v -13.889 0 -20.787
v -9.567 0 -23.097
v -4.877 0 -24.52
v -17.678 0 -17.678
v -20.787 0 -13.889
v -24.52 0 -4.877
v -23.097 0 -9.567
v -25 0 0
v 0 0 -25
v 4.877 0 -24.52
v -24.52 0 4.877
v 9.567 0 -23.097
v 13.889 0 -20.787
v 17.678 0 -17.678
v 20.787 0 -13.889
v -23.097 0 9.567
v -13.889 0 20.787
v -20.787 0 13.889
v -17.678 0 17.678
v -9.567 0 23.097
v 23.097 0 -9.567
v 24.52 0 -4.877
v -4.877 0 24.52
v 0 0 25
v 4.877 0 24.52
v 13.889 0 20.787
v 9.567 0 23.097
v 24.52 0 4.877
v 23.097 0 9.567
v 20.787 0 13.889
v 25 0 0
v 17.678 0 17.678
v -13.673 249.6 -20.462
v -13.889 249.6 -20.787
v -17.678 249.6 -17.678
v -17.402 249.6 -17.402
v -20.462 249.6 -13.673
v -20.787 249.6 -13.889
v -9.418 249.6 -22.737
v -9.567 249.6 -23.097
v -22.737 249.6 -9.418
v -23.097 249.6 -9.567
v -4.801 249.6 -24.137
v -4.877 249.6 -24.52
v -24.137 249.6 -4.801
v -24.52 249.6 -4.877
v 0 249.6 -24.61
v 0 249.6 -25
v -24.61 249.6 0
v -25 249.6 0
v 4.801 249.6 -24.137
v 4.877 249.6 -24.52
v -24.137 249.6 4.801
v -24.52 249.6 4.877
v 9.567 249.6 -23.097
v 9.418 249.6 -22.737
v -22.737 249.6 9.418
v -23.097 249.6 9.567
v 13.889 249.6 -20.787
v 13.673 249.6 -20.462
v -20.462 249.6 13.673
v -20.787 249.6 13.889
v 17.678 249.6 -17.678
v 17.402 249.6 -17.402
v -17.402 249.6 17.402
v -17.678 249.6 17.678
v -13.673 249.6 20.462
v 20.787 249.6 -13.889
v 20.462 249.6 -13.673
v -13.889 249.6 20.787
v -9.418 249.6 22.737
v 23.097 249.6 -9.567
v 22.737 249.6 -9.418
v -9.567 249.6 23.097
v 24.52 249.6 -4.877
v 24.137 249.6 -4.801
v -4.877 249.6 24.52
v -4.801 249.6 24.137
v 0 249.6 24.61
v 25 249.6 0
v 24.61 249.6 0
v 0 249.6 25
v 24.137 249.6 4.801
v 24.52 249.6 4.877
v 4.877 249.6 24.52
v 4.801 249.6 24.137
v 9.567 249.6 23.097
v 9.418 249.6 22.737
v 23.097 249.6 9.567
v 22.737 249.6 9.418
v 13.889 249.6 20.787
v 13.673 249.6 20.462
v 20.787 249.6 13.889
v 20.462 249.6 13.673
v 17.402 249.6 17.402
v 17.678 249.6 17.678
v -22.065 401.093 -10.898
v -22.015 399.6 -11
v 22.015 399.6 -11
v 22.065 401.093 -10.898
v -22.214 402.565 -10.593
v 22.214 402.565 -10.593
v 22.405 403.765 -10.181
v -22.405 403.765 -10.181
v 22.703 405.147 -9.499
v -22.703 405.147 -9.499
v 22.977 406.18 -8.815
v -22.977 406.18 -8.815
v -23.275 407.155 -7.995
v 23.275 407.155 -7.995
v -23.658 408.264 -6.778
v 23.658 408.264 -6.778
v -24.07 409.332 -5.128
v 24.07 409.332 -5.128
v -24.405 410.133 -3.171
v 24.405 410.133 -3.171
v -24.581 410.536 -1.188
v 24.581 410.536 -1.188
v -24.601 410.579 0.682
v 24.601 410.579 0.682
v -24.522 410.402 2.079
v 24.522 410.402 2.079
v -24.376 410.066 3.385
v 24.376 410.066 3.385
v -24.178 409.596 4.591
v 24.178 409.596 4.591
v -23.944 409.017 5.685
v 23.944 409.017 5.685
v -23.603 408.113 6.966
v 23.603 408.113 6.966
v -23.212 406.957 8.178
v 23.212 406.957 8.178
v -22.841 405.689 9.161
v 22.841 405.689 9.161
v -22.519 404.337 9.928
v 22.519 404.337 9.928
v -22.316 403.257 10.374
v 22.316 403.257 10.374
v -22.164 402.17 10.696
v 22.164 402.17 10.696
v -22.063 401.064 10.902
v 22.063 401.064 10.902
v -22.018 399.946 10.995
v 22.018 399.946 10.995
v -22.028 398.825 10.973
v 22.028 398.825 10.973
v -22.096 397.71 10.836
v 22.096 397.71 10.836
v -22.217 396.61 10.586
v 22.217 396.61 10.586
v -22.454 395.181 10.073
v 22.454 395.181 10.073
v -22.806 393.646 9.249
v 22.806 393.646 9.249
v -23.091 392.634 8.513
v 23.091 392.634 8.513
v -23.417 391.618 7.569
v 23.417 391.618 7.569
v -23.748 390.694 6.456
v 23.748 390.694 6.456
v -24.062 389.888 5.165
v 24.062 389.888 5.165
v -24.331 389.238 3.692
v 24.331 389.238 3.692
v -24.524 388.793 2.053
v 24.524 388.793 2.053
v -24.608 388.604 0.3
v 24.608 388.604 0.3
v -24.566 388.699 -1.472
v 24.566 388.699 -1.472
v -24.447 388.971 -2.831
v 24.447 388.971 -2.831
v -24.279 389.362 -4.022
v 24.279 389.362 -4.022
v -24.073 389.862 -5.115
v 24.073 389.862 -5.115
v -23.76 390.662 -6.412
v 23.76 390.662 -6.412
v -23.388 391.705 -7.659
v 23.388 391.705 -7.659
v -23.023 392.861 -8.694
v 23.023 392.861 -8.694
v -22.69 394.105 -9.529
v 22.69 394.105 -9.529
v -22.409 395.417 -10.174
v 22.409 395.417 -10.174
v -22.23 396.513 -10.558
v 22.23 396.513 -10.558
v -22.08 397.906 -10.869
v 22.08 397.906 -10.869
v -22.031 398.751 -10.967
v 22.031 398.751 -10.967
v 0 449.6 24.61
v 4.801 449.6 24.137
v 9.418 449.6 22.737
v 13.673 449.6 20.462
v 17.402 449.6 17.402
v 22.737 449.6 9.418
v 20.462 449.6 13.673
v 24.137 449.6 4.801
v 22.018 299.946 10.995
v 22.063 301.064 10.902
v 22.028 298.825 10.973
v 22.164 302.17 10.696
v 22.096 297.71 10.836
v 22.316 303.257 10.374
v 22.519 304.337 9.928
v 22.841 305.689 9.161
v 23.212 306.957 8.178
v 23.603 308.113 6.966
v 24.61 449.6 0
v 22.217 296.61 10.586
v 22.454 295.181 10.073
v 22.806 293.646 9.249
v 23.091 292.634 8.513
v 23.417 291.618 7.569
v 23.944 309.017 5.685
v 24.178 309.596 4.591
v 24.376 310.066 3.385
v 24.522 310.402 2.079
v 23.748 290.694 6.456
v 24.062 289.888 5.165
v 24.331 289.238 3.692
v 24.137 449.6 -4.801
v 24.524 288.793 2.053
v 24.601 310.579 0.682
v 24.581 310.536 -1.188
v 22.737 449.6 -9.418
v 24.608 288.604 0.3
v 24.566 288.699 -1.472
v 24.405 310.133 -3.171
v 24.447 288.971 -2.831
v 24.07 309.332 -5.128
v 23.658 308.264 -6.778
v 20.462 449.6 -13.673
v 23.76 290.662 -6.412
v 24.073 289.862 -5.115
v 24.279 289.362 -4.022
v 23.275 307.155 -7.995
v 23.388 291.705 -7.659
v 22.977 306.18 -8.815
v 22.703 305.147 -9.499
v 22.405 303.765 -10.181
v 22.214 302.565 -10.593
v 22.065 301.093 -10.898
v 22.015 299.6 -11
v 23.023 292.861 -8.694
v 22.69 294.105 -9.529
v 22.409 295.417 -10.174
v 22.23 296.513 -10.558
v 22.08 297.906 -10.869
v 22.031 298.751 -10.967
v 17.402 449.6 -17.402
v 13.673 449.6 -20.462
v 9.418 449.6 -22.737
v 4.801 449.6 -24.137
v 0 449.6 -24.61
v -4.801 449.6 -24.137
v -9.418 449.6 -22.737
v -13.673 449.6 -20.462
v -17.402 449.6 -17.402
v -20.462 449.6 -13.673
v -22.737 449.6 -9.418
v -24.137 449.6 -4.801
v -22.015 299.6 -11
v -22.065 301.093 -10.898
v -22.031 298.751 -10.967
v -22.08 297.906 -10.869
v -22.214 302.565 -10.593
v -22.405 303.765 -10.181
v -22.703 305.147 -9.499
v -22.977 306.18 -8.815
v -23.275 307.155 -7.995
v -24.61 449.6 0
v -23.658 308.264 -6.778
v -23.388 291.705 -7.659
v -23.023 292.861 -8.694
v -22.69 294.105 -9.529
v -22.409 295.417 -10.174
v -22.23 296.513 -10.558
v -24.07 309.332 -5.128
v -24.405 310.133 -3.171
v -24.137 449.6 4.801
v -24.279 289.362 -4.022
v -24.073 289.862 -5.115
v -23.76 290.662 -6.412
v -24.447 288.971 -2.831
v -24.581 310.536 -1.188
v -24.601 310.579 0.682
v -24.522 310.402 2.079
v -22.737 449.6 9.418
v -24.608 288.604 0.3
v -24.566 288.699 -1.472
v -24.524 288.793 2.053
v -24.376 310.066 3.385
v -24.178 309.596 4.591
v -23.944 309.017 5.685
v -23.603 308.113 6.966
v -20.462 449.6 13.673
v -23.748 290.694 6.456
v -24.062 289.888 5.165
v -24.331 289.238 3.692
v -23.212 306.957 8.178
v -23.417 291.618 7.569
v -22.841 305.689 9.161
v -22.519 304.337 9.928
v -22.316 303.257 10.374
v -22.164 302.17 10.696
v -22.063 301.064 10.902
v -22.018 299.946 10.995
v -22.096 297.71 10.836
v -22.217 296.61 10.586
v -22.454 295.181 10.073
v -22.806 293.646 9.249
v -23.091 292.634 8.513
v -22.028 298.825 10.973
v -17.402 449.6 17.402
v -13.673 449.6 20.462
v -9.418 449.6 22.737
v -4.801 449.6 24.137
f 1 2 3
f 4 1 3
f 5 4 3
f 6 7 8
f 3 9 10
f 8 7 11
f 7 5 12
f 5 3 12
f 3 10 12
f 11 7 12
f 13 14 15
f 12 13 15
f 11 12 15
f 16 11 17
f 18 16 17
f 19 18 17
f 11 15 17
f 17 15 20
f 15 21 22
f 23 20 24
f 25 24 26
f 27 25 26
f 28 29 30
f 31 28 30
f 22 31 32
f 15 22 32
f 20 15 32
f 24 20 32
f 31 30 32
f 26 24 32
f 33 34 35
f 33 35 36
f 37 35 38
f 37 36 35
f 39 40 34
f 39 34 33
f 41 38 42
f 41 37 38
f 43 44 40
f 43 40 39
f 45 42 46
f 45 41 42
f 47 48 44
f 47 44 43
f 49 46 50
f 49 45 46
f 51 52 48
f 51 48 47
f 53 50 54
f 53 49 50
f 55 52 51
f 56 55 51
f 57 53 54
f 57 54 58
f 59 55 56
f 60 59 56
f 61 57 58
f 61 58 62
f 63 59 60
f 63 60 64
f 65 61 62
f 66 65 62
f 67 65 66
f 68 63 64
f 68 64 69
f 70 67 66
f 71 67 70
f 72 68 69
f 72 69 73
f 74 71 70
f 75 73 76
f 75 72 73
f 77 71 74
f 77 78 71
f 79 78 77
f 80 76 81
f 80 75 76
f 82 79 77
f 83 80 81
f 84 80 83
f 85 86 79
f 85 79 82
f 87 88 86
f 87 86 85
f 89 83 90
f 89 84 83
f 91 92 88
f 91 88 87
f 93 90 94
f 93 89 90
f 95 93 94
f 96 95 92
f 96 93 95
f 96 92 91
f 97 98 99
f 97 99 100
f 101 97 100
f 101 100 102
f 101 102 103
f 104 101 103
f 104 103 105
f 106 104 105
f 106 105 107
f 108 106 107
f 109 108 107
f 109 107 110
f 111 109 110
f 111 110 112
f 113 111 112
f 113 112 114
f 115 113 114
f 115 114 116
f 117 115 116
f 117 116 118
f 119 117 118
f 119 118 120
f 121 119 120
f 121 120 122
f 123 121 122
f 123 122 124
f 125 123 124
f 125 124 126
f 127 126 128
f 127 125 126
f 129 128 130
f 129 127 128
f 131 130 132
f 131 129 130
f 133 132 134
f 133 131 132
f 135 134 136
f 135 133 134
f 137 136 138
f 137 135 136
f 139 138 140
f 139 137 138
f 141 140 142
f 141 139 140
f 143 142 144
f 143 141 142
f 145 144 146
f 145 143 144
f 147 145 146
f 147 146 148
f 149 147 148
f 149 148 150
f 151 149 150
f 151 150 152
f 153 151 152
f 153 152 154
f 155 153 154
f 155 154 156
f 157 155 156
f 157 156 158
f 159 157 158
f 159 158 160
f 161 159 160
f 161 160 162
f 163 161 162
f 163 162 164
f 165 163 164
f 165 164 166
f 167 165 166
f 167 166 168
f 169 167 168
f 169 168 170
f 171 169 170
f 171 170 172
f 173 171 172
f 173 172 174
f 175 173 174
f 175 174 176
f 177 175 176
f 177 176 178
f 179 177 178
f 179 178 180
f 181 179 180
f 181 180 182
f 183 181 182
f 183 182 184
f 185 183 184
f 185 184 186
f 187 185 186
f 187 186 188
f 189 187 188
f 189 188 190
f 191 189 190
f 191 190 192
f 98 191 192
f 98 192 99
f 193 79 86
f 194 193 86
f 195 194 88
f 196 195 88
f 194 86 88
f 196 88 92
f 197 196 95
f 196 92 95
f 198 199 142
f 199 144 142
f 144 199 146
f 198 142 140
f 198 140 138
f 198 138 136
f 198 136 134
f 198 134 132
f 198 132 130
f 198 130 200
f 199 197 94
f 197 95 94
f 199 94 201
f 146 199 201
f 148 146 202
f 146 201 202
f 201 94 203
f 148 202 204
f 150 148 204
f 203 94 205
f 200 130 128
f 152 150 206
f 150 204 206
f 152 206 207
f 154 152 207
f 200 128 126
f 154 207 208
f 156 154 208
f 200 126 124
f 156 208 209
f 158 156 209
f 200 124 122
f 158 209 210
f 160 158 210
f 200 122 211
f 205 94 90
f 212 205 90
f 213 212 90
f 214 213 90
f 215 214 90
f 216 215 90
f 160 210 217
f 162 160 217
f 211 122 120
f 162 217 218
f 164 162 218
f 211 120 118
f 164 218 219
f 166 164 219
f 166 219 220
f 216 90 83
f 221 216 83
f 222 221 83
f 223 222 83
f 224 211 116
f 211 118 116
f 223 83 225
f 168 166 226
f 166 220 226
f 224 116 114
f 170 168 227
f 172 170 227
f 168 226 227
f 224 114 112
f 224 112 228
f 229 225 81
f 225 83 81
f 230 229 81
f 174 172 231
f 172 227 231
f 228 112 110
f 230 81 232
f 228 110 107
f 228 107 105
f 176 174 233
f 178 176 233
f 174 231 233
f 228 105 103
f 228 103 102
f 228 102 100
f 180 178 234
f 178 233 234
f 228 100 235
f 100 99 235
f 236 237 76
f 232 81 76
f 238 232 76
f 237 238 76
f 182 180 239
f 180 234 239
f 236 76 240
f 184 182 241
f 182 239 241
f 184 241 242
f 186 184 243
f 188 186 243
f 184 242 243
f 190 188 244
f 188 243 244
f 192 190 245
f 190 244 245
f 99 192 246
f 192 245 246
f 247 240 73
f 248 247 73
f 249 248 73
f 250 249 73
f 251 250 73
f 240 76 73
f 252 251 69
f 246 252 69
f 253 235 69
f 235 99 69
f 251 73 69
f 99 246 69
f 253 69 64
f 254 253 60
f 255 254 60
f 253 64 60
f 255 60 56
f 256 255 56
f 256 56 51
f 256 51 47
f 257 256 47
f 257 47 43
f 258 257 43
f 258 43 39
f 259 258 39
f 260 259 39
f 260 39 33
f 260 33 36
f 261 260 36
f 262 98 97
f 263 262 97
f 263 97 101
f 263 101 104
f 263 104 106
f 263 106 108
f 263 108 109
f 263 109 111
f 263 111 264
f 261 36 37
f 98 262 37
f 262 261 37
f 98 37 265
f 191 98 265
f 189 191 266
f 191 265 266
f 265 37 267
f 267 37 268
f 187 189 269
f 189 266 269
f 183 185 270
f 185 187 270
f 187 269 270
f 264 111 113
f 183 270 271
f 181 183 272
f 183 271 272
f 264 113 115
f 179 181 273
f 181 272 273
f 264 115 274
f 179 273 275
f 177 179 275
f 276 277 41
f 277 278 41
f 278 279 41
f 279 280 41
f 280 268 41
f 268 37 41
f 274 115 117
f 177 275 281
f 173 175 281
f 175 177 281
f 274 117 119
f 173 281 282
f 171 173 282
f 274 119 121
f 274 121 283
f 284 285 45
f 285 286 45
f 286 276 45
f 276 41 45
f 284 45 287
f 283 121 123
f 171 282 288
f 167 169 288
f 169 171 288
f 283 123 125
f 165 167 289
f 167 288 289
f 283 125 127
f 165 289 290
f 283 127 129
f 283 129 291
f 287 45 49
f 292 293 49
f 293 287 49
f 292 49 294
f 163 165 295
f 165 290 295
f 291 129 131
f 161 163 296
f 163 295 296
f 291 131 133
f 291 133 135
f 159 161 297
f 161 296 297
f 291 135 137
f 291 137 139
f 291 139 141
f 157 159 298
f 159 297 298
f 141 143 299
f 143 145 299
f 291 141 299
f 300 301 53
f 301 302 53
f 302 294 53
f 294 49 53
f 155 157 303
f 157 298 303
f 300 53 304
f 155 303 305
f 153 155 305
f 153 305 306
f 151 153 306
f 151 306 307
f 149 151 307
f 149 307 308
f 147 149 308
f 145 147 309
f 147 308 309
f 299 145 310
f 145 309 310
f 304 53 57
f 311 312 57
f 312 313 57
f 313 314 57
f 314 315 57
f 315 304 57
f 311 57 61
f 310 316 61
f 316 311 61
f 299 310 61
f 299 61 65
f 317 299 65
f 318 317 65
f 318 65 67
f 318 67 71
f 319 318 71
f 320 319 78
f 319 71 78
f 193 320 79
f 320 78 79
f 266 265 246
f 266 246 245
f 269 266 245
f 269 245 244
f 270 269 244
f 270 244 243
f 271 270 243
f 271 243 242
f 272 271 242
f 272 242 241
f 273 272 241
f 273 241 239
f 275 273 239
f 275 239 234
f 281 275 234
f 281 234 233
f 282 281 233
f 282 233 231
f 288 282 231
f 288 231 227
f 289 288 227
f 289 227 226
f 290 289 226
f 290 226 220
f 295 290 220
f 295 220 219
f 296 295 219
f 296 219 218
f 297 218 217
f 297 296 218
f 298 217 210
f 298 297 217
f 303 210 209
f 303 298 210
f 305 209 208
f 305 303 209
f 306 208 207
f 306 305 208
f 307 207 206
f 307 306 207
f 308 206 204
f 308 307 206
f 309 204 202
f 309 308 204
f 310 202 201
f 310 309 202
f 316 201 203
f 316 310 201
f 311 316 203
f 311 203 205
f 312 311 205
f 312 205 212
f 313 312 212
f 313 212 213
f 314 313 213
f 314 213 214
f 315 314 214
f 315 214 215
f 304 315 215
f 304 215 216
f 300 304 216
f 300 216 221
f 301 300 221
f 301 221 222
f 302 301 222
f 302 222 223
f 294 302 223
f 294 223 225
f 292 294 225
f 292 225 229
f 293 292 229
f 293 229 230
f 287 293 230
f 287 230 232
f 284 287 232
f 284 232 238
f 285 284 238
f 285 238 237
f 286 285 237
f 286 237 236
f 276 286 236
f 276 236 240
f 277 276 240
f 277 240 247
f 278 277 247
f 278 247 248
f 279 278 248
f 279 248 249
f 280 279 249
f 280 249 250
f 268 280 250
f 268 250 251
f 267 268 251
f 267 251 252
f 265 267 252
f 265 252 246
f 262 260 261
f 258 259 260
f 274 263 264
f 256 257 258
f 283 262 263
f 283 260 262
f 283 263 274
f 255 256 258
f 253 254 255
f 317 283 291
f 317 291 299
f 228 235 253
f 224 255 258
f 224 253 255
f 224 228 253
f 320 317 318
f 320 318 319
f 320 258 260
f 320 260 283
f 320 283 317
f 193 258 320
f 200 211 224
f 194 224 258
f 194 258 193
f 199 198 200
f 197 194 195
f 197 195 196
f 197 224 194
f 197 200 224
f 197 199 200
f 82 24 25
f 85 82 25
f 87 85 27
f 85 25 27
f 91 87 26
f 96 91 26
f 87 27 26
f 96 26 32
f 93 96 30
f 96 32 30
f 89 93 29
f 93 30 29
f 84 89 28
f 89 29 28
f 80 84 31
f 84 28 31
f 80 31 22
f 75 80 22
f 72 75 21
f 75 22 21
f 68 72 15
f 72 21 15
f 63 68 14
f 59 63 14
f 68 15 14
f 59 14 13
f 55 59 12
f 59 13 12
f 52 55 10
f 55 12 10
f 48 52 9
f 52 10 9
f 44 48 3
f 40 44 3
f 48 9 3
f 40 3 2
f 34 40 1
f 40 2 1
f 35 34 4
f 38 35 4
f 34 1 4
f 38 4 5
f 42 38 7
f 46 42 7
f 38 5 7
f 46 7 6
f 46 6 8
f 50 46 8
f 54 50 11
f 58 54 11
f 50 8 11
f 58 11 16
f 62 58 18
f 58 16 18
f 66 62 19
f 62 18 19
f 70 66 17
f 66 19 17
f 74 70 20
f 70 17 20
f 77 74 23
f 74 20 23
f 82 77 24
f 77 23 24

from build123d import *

# Parameters (mm, degrees)
SKETCH1_R               = 25
BOSS_EXTRUDE1_DEPTH     = 249.6
SKETCH2_R               = 24.61
BOSS_EXTRUDE2_DEPTH     = 200
CUT_EXTRUDE1_DEPTH      = 451.987982102
CUT_EXTRUDE1_DEPTH_BACK = 451.987982102
SKETCH3_R               = 11


with BuildPart() as part:
    # Sketch1 → Boss-Extrude1 (new body)
    with BuildSketch(Plane(origin=(0, 0, 0), x_dir=(1, 0, 0), z_dir=(0, 1, 0))):
        with Locations(Location((0, 0, 0), (0, 0, 270))):
            Circle(SKETCH1_R)
    extrude(amount=BOSS_EXTRUDE1_DEPTH)

    # Sketch2 → Boss-Extrude2 (add)
    with BuildSketch(Plane(origin=(0, 249.6, 0), x_dir=(1, 0, 0), z_dir=(0, 1, 0))):
        with Locations(Location((0, 0, 0), (0, 0, 270))):
            Circle(SKETCH2_R)
    extrude(amount=BOSS_EXTRUDE2_DEPTH)

    # Sketch3 → Cut-Extrude1 (cut, two sides: drawn at the far end of the back side and taken through both)
    with BuildSketch(Plane(origin=(0, 0, 0), x_dir=(0, 0, -1), z_dir=(1, 0, 0)).offset(-CUT_EXTRUDE1_DEPTH_BACK)):
        with Locations((0, 299.6)):
            Circle(SKETCH3_R)
        with Locations((0, 399.6)):
            Circle(SKETCH3_R)
    extrude(amount=CUT_EXTRUDE1_DEPTH + CUT_EXTRUDE1_DEPTH_BACK, mode=Mode.SUBTRACT)


solid = part.part
